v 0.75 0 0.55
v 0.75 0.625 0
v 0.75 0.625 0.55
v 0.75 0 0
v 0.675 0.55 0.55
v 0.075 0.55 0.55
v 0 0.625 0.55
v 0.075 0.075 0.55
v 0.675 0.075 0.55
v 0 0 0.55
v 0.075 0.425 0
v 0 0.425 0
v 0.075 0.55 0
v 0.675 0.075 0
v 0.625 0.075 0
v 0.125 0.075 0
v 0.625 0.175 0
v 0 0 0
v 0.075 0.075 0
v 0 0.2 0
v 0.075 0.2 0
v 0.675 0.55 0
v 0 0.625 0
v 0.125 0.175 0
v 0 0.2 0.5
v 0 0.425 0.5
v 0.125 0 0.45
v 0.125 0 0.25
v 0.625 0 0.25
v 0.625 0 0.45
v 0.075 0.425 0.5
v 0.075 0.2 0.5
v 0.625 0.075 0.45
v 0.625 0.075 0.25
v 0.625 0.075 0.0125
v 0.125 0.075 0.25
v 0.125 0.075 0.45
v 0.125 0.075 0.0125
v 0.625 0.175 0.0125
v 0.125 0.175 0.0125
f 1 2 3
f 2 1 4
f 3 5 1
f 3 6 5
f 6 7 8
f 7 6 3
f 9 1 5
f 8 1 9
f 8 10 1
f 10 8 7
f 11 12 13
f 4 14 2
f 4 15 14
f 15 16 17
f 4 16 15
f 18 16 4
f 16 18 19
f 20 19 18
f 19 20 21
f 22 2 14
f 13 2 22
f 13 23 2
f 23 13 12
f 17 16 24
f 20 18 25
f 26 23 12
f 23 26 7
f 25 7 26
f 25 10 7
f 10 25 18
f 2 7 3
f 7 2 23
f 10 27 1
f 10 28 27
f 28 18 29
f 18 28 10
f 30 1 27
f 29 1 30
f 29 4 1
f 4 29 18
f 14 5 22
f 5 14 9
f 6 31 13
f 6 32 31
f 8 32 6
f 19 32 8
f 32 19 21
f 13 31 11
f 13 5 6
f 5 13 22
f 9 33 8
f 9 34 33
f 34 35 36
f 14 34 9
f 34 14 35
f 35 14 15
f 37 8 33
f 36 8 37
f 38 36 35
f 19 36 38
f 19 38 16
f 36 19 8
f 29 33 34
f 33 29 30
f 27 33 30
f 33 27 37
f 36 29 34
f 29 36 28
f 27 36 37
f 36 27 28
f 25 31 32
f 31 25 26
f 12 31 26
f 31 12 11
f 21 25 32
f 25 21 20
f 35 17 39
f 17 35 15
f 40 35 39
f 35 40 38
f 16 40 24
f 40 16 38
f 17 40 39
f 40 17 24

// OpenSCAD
// Parametric OpenSCAD model of an open-top hollow enclosure with
// front and left side openings, plus an internal front ledge.
// All dimensions in millimeters.

// ---------- Global parameters ----------
$fn = 100;  // smoothing for any curved primitives (none used, but good practice)

// Overall outer envelope
total_width = 0.75;
total_depth = 0.625;
total_height = 0.55;

// Wall thickness (used for all walls, top and bottom are open)
wall_thickness = 0.075;

// ---------- Derived inner dimensions ----------
inner_width = total_width - 2 * wall_thickness;   // 0.6
inner_depth = total_depth - 2 * wall_thickness;   // 0.475
// inner void runs full height (open top and bottom)

// ---------- Front wall cut (horizontal rectangular opening) ----------
front_cut_length = 0.5;
front_cut_low_z = 0.25;
front_cut_high_z = 0.45;
front_cut_height = front_cut_high_z - front_cut_low_z; // 0.2
front_cut_x_offset = (total_width - front_cut_length) / 2; // 0.125, centered
front_cut_depth = wall_thickness;  // cuts through entire front wall

// ---------- Left side opening (vertical rectangular opening) ----------
left_cut_depth = wall_thickness;            // cuts inward from left face
left_cut_y_front_margin = 0.2;
left_cut_y_back_margin = 0.2;
left_cut_y_span = total_depth - left_cut_y_front_margin - left_cut_y_back_margin; // 0.225
left_cut_y_start = left_cut_y_front_margin; // 0.2
left_cut_height = 0.5;                     // from underside (z=0) up to 0.5
left_cut_z_start = 0;

// ---------- Internal front ledge ----------
ledge_length = 0.5;
ledge_width = 0.1;           // protrudes into interior from front inner face
ledge_thickness = 0.0125;     // thickness (small tier)
ledge_x_offset = (total_width - ledge_length) / 2; // 0.125, centered
ledge_y_back = wall_thickness; // attaches to front inner face at y=0.075
ledge_z_start = 0;            // vertical position at bottom (adjustable)

// ---------- Modules ----------

// Creates the hollow shell: walls only, no top or bottom.
module hollow_body() {
    difference() {
        // outer solid block
        cube([total_width, total_depth, total_height]);
        // subtract inner void, slightly oversized in height to remove floor and ceiling
        translate([wall_thickness, wall_thickness, -1])
            cube([inner_width, inner_depth, total_height + 2]);
    }
}

// Adds the internal ledge (shallow tier) on the front inner wall.
module internal_ledge() {
    translate([ledge_x_offset, ledge_y_back, ledge_z_start])
        cube([ledge_length, ledge_width, ledge_thickness]);
}

// ---------- Main assembly ----------
union() {
    // Hollow enclosure with cutouts
    difference() {
        hollow_body();

        // Front horizontal wall cut (subtractive)
        translate([front_cut_x_offset, -0.01, front_cut_low_z])
            cube([front_cut_length, front_cut_depth + 0.01, front_cut_height]);

        // Left vertical side opening (subtractive)
        translate([-0.01, left_cut_y_start, left_cut_z_start])
            cube([left_cut_depth + 0.01, left_cut_y_span, left_cut_height]);
    }

    // Attach the thin internal ledge
    internal_ledge();
}
